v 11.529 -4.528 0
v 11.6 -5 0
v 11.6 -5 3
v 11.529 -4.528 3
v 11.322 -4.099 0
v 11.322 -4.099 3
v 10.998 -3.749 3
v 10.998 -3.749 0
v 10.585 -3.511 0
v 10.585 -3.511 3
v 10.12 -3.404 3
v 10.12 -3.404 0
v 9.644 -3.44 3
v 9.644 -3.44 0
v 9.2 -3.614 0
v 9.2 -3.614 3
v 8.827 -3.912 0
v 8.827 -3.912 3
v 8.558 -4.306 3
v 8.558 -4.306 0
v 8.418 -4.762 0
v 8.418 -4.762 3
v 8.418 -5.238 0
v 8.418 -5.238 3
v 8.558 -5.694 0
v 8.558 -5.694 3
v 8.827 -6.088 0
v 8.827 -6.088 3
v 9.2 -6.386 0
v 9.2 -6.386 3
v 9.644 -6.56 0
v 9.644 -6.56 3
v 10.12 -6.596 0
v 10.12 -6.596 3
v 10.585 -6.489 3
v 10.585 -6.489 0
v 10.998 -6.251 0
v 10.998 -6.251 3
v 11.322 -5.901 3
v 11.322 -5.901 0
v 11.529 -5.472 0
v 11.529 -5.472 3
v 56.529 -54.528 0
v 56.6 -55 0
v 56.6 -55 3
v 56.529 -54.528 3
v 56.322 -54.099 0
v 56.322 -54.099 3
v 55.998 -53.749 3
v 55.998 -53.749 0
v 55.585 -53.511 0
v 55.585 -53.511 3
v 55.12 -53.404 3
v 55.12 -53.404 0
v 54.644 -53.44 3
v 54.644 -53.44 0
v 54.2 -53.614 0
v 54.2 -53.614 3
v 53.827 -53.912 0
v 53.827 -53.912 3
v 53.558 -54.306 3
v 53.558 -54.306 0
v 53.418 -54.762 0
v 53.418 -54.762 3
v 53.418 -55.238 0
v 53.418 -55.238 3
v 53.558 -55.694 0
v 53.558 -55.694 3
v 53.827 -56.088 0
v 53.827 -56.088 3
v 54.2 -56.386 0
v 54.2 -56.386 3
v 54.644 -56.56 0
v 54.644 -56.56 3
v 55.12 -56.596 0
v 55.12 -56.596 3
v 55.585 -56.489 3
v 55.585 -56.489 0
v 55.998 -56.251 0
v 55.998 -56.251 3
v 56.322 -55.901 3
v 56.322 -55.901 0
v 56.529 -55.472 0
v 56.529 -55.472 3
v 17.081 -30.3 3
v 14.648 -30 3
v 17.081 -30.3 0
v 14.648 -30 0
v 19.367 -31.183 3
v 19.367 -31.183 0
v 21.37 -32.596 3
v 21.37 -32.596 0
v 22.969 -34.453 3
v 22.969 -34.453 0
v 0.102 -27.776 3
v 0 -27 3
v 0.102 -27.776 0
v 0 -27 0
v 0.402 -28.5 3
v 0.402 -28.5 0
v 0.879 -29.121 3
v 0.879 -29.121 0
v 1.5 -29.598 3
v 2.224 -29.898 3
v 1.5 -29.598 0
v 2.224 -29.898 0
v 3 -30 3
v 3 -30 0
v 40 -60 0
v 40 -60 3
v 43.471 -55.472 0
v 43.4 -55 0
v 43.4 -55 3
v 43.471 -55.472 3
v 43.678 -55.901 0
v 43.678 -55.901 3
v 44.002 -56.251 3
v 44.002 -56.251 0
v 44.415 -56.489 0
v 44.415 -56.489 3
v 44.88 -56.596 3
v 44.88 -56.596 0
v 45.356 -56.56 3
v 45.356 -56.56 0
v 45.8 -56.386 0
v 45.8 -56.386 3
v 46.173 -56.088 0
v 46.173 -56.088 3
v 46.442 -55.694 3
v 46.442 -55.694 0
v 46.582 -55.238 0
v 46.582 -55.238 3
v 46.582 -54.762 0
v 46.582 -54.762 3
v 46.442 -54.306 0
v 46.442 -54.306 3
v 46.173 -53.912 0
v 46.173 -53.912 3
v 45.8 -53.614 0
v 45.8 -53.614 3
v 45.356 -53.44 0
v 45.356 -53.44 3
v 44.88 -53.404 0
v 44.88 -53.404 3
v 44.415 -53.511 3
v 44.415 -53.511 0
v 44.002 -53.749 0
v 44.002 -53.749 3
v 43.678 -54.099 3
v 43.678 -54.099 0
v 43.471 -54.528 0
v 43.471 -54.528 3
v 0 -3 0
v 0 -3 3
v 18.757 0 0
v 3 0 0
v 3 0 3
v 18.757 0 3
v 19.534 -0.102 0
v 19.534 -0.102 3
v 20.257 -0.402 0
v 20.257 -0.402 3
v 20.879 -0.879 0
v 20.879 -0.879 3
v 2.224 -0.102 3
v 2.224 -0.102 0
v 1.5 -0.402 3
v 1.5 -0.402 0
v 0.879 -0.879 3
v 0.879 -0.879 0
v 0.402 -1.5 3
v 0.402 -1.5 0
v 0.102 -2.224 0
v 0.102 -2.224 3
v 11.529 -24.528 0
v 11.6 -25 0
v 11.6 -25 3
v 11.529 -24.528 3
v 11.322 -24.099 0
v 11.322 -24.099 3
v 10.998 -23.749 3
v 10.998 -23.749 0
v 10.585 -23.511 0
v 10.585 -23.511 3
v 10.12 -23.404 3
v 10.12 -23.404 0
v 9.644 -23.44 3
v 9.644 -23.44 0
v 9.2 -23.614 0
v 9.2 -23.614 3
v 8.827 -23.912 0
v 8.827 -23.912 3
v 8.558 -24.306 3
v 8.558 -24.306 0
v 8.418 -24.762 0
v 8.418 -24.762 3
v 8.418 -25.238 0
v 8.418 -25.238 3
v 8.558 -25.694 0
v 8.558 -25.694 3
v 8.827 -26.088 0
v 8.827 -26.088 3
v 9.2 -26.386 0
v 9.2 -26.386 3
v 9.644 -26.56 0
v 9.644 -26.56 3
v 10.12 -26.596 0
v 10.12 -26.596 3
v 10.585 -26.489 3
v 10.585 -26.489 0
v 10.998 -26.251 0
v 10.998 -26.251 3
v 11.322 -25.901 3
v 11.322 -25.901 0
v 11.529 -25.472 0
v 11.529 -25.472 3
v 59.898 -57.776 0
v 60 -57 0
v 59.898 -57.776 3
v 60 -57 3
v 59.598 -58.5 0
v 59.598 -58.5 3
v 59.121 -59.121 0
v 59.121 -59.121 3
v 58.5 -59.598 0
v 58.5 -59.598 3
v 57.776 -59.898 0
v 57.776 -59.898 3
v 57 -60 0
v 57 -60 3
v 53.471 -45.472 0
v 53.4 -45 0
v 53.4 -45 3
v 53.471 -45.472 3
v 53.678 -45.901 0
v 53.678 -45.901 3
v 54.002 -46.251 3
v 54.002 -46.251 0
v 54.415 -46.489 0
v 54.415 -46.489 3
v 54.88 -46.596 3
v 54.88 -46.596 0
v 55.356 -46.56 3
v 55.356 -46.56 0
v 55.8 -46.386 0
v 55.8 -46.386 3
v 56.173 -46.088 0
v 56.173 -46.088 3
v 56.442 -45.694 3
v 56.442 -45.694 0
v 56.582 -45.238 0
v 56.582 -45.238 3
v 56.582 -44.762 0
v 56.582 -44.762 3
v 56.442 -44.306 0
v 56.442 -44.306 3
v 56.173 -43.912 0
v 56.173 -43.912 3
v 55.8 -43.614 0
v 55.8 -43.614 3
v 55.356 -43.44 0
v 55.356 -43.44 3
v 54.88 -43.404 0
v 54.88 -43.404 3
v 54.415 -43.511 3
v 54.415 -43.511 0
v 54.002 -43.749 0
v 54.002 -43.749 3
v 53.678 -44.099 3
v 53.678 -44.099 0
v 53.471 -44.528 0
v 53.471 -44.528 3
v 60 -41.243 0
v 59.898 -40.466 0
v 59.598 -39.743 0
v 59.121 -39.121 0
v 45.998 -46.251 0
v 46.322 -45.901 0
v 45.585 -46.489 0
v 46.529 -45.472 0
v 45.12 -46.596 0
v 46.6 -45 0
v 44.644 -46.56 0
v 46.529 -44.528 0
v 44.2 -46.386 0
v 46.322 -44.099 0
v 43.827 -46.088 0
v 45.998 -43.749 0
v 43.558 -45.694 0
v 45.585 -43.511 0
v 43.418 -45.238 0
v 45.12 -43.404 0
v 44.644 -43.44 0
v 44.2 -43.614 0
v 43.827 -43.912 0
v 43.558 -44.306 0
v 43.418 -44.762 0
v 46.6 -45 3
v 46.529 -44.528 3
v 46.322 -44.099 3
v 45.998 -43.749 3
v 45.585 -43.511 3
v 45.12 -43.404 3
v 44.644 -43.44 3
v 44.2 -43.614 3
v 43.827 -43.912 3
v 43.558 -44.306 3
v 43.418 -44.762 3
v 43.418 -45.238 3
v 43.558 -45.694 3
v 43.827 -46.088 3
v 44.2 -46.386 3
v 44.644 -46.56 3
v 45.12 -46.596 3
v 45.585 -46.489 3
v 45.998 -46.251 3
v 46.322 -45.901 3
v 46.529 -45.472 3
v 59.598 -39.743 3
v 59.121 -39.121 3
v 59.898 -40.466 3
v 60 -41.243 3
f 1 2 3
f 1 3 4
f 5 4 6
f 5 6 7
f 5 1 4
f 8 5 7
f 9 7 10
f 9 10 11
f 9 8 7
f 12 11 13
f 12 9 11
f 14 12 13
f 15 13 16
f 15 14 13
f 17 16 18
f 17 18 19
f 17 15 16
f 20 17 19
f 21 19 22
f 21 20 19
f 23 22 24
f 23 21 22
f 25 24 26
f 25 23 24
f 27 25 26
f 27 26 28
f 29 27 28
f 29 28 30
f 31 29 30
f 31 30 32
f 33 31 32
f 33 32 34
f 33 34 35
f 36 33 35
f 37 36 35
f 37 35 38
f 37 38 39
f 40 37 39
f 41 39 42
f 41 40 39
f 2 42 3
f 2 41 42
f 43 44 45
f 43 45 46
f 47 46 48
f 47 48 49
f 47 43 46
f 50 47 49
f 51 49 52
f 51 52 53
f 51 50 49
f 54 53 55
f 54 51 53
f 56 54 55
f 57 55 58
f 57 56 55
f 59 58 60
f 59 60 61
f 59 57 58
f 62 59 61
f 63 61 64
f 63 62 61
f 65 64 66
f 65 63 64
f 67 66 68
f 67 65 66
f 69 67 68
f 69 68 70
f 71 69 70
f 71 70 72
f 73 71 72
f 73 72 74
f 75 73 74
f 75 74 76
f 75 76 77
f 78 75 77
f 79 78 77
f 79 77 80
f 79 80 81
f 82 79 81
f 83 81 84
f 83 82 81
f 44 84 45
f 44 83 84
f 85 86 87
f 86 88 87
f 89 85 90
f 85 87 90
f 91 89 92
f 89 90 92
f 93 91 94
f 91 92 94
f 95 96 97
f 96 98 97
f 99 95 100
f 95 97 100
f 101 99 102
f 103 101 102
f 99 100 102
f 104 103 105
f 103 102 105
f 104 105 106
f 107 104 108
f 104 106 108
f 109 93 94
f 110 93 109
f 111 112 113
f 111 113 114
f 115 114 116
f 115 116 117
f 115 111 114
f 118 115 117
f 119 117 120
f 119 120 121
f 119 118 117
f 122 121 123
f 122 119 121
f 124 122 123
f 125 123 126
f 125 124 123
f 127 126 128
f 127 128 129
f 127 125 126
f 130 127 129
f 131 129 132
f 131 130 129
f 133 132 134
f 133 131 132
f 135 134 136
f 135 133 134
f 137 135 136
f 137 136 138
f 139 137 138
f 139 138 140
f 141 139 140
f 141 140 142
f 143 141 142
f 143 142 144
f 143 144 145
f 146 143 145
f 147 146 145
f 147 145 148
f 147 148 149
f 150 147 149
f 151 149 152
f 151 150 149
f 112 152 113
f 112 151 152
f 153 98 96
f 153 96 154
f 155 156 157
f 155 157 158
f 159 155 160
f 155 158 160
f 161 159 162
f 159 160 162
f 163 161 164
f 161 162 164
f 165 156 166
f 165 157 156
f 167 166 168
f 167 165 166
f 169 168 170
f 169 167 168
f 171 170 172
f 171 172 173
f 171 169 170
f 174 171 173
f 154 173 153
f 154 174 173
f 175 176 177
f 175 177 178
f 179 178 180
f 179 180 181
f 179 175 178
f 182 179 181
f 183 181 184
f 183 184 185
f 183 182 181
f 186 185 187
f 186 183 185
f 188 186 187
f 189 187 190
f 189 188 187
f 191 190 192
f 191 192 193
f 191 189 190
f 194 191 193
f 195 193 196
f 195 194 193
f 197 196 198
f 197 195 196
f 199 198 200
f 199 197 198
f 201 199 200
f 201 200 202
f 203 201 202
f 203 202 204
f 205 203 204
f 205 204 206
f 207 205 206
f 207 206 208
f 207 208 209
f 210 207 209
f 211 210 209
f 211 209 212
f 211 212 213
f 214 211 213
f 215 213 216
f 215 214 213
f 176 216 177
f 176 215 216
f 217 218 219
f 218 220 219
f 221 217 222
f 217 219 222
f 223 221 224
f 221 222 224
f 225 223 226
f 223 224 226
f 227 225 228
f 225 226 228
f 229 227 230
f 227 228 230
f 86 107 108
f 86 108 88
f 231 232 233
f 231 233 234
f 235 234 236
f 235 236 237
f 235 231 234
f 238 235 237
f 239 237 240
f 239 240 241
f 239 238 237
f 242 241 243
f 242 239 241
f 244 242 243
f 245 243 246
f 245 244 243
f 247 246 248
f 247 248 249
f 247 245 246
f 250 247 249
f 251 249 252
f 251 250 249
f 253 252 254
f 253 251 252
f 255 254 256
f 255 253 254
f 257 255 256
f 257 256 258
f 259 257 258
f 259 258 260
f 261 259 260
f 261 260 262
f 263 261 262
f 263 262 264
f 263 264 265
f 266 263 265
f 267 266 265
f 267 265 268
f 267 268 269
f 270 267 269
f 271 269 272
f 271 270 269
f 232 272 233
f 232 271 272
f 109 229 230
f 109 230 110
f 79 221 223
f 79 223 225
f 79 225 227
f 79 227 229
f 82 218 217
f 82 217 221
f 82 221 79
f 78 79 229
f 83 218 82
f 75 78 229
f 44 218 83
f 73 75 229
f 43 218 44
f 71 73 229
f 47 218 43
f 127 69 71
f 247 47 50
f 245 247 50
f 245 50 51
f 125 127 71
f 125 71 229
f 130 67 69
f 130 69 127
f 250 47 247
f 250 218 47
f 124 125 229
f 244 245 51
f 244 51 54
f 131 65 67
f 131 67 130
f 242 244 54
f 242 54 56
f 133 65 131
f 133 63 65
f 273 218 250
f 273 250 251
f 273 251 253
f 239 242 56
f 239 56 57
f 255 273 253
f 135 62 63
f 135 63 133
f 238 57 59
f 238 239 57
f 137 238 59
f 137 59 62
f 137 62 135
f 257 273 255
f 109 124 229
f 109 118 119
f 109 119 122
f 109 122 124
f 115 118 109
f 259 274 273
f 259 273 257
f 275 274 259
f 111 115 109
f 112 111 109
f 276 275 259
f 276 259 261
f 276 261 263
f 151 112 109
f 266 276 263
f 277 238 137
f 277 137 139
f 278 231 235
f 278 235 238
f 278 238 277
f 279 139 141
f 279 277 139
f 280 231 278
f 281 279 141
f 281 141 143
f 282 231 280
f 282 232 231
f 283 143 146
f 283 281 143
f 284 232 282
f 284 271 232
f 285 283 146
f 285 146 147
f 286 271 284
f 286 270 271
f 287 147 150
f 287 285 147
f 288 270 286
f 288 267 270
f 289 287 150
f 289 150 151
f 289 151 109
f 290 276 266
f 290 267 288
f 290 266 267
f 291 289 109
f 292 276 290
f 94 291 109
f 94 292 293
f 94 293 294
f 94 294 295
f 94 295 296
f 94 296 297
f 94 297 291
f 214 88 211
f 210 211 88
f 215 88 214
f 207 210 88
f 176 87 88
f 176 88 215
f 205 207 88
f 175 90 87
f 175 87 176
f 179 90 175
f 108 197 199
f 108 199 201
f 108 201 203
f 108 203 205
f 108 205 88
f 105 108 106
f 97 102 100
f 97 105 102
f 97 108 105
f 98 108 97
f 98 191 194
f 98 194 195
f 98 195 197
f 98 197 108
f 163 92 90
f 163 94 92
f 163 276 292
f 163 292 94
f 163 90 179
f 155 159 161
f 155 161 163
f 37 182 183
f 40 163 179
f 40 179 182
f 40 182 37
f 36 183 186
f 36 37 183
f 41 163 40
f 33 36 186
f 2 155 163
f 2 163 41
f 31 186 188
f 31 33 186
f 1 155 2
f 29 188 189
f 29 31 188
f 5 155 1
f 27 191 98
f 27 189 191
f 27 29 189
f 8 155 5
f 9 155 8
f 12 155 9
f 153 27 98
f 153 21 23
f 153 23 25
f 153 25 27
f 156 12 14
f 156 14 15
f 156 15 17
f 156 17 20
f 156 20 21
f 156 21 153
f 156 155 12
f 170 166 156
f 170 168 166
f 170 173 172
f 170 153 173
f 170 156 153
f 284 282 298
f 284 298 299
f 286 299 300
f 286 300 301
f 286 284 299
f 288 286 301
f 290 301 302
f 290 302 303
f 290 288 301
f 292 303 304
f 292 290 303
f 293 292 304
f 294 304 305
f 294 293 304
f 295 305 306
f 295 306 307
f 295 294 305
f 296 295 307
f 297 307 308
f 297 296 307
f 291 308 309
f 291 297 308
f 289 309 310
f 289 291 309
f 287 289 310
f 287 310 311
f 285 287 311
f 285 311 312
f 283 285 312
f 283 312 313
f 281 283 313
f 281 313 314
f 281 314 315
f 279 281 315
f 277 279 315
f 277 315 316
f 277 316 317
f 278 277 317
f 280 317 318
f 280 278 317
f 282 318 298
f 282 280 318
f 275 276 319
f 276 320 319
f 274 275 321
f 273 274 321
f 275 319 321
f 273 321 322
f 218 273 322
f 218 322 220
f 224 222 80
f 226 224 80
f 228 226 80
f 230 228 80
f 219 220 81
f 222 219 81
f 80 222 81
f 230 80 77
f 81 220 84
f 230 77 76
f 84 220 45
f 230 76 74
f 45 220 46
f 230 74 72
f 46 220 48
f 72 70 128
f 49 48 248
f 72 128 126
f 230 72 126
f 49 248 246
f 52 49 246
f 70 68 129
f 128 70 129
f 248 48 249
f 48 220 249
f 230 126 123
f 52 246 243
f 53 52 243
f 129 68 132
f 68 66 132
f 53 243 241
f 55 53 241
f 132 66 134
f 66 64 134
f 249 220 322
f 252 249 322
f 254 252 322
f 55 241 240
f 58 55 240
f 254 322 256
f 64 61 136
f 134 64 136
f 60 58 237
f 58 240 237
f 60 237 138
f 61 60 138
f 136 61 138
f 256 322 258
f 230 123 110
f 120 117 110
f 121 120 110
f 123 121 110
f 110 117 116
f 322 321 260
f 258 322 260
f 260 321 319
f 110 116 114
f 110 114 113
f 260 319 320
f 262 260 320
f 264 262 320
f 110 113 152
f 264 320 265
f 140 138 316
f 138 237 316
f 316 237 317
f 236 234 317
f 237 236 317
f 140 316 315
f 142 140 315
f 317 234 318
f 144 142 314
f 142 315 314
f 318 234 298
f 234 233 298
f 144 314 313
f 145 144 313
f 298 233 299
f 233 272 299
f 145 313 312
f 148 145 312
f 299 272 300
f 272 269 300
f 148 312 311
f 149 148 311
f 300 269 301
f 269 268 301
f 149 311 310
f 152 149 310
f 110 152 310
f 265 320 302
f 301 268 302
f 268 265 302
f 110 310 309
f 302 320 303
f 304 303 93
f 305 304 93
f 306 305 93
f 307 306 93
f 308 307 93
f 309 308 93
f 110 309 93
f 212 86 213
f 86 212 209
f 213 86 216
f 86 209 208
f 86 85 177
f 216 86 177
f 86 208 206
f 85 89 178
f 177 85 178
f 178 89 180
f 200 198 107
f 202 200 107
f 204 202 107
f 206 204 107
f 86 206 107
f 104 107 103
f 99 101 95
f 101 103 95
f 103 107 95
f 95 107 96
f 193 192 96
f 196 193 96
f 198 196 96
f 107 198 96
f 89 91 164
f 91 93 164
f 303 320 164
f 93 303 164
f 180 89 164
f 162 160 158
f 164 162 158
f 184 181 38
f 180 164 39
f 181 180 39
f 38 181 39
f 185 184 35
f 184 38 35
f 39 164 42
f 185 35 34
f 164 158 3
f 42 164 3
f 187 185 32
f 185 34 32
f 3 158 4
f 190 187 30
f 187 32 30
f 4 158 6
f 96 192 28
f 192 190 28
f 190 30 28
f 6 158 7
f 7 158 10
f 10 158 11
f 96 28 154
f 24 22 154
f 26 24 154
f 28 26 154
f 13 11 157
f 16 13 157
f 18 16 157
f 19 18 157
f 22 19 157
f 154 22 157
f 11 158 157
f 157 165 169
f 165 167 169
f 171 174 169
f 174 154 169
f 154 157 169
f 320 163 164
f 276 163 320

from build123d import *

# Parameters (mm, degrees)
SKETCH_1_R          = 1.6
EXTRUDE_1_DEPTH     = 3
CUT_EXTRUDE_1_DEPTH = 85.905830189
FILLET_1_R          = 3
FILLET_2_R          = 10


with BuildPart() as part:
    # 草图1 → 凸台-拉伸1 (new body)
    with BuildSketch(Plane.XY):
        Polygon((0, 0), (20, 0), (60, -40), (60, -60), (0, -60), align=None)
        with Locations((10, -5)):
            Circle(SKETCH_1_R, mode=Mode.SUBTRACT)
        with Locations((10, -25)):
            Circle(SKETCH_1_R, mode=Mode.SUBTRACT)
        with Locations((55, -55)):
            Circle(SKETCH_1_R, mode=Mode.SUBTRACT)
        with Locations(Location((55, -45, 0), (0, 0, 180))):
            Circle(SKETCH_1_R, mode=Mode.SUBTRACT)
        with Locations(Location((45, -55, 0), (0, 0, 180))):
            Circle(SKETCH_1_R, mode=Mode.SUBTRACT)
        with Locations((45, -45)):
            Circle(SKETCH_1_R, mode=Mode.SUBTRACT)
    extrude(amount=EXTRUDE_1_DEPTH)

    # 草图2 → 切除-拉伸1 (cut, through all)
    with BuildSketch(Plane.XY.offset(3)):
        Polygon((40, -60), (0, -60), (0, -30), (20, -30), align=None)
    extrude(amount=-CUT_EXTRUDE_1_DEPTH, mode=Mode.SUBTRACT)

    # 圆角1
    fillet_1_edges = [part.edges().sort_by_distance(p)[0] for p in [
        (0, -30, 1.5),
        (0, 0, 1.5),
        (20, 0, 1.5),
        (60, -40, 1.5),
        (60, -60, 1.5),
    ]]
    fillet(fillet_1_edges, radius=FILLET_1_R)

    # 圆角2
    fillet_2_edges = [part.edges().sort_by_distance(p)[0] for p in [
        (20, -30, 1.5),
    ]]
    fillet(fillet_2_edges, radius=FILLET_2_R)


solid = part.part
